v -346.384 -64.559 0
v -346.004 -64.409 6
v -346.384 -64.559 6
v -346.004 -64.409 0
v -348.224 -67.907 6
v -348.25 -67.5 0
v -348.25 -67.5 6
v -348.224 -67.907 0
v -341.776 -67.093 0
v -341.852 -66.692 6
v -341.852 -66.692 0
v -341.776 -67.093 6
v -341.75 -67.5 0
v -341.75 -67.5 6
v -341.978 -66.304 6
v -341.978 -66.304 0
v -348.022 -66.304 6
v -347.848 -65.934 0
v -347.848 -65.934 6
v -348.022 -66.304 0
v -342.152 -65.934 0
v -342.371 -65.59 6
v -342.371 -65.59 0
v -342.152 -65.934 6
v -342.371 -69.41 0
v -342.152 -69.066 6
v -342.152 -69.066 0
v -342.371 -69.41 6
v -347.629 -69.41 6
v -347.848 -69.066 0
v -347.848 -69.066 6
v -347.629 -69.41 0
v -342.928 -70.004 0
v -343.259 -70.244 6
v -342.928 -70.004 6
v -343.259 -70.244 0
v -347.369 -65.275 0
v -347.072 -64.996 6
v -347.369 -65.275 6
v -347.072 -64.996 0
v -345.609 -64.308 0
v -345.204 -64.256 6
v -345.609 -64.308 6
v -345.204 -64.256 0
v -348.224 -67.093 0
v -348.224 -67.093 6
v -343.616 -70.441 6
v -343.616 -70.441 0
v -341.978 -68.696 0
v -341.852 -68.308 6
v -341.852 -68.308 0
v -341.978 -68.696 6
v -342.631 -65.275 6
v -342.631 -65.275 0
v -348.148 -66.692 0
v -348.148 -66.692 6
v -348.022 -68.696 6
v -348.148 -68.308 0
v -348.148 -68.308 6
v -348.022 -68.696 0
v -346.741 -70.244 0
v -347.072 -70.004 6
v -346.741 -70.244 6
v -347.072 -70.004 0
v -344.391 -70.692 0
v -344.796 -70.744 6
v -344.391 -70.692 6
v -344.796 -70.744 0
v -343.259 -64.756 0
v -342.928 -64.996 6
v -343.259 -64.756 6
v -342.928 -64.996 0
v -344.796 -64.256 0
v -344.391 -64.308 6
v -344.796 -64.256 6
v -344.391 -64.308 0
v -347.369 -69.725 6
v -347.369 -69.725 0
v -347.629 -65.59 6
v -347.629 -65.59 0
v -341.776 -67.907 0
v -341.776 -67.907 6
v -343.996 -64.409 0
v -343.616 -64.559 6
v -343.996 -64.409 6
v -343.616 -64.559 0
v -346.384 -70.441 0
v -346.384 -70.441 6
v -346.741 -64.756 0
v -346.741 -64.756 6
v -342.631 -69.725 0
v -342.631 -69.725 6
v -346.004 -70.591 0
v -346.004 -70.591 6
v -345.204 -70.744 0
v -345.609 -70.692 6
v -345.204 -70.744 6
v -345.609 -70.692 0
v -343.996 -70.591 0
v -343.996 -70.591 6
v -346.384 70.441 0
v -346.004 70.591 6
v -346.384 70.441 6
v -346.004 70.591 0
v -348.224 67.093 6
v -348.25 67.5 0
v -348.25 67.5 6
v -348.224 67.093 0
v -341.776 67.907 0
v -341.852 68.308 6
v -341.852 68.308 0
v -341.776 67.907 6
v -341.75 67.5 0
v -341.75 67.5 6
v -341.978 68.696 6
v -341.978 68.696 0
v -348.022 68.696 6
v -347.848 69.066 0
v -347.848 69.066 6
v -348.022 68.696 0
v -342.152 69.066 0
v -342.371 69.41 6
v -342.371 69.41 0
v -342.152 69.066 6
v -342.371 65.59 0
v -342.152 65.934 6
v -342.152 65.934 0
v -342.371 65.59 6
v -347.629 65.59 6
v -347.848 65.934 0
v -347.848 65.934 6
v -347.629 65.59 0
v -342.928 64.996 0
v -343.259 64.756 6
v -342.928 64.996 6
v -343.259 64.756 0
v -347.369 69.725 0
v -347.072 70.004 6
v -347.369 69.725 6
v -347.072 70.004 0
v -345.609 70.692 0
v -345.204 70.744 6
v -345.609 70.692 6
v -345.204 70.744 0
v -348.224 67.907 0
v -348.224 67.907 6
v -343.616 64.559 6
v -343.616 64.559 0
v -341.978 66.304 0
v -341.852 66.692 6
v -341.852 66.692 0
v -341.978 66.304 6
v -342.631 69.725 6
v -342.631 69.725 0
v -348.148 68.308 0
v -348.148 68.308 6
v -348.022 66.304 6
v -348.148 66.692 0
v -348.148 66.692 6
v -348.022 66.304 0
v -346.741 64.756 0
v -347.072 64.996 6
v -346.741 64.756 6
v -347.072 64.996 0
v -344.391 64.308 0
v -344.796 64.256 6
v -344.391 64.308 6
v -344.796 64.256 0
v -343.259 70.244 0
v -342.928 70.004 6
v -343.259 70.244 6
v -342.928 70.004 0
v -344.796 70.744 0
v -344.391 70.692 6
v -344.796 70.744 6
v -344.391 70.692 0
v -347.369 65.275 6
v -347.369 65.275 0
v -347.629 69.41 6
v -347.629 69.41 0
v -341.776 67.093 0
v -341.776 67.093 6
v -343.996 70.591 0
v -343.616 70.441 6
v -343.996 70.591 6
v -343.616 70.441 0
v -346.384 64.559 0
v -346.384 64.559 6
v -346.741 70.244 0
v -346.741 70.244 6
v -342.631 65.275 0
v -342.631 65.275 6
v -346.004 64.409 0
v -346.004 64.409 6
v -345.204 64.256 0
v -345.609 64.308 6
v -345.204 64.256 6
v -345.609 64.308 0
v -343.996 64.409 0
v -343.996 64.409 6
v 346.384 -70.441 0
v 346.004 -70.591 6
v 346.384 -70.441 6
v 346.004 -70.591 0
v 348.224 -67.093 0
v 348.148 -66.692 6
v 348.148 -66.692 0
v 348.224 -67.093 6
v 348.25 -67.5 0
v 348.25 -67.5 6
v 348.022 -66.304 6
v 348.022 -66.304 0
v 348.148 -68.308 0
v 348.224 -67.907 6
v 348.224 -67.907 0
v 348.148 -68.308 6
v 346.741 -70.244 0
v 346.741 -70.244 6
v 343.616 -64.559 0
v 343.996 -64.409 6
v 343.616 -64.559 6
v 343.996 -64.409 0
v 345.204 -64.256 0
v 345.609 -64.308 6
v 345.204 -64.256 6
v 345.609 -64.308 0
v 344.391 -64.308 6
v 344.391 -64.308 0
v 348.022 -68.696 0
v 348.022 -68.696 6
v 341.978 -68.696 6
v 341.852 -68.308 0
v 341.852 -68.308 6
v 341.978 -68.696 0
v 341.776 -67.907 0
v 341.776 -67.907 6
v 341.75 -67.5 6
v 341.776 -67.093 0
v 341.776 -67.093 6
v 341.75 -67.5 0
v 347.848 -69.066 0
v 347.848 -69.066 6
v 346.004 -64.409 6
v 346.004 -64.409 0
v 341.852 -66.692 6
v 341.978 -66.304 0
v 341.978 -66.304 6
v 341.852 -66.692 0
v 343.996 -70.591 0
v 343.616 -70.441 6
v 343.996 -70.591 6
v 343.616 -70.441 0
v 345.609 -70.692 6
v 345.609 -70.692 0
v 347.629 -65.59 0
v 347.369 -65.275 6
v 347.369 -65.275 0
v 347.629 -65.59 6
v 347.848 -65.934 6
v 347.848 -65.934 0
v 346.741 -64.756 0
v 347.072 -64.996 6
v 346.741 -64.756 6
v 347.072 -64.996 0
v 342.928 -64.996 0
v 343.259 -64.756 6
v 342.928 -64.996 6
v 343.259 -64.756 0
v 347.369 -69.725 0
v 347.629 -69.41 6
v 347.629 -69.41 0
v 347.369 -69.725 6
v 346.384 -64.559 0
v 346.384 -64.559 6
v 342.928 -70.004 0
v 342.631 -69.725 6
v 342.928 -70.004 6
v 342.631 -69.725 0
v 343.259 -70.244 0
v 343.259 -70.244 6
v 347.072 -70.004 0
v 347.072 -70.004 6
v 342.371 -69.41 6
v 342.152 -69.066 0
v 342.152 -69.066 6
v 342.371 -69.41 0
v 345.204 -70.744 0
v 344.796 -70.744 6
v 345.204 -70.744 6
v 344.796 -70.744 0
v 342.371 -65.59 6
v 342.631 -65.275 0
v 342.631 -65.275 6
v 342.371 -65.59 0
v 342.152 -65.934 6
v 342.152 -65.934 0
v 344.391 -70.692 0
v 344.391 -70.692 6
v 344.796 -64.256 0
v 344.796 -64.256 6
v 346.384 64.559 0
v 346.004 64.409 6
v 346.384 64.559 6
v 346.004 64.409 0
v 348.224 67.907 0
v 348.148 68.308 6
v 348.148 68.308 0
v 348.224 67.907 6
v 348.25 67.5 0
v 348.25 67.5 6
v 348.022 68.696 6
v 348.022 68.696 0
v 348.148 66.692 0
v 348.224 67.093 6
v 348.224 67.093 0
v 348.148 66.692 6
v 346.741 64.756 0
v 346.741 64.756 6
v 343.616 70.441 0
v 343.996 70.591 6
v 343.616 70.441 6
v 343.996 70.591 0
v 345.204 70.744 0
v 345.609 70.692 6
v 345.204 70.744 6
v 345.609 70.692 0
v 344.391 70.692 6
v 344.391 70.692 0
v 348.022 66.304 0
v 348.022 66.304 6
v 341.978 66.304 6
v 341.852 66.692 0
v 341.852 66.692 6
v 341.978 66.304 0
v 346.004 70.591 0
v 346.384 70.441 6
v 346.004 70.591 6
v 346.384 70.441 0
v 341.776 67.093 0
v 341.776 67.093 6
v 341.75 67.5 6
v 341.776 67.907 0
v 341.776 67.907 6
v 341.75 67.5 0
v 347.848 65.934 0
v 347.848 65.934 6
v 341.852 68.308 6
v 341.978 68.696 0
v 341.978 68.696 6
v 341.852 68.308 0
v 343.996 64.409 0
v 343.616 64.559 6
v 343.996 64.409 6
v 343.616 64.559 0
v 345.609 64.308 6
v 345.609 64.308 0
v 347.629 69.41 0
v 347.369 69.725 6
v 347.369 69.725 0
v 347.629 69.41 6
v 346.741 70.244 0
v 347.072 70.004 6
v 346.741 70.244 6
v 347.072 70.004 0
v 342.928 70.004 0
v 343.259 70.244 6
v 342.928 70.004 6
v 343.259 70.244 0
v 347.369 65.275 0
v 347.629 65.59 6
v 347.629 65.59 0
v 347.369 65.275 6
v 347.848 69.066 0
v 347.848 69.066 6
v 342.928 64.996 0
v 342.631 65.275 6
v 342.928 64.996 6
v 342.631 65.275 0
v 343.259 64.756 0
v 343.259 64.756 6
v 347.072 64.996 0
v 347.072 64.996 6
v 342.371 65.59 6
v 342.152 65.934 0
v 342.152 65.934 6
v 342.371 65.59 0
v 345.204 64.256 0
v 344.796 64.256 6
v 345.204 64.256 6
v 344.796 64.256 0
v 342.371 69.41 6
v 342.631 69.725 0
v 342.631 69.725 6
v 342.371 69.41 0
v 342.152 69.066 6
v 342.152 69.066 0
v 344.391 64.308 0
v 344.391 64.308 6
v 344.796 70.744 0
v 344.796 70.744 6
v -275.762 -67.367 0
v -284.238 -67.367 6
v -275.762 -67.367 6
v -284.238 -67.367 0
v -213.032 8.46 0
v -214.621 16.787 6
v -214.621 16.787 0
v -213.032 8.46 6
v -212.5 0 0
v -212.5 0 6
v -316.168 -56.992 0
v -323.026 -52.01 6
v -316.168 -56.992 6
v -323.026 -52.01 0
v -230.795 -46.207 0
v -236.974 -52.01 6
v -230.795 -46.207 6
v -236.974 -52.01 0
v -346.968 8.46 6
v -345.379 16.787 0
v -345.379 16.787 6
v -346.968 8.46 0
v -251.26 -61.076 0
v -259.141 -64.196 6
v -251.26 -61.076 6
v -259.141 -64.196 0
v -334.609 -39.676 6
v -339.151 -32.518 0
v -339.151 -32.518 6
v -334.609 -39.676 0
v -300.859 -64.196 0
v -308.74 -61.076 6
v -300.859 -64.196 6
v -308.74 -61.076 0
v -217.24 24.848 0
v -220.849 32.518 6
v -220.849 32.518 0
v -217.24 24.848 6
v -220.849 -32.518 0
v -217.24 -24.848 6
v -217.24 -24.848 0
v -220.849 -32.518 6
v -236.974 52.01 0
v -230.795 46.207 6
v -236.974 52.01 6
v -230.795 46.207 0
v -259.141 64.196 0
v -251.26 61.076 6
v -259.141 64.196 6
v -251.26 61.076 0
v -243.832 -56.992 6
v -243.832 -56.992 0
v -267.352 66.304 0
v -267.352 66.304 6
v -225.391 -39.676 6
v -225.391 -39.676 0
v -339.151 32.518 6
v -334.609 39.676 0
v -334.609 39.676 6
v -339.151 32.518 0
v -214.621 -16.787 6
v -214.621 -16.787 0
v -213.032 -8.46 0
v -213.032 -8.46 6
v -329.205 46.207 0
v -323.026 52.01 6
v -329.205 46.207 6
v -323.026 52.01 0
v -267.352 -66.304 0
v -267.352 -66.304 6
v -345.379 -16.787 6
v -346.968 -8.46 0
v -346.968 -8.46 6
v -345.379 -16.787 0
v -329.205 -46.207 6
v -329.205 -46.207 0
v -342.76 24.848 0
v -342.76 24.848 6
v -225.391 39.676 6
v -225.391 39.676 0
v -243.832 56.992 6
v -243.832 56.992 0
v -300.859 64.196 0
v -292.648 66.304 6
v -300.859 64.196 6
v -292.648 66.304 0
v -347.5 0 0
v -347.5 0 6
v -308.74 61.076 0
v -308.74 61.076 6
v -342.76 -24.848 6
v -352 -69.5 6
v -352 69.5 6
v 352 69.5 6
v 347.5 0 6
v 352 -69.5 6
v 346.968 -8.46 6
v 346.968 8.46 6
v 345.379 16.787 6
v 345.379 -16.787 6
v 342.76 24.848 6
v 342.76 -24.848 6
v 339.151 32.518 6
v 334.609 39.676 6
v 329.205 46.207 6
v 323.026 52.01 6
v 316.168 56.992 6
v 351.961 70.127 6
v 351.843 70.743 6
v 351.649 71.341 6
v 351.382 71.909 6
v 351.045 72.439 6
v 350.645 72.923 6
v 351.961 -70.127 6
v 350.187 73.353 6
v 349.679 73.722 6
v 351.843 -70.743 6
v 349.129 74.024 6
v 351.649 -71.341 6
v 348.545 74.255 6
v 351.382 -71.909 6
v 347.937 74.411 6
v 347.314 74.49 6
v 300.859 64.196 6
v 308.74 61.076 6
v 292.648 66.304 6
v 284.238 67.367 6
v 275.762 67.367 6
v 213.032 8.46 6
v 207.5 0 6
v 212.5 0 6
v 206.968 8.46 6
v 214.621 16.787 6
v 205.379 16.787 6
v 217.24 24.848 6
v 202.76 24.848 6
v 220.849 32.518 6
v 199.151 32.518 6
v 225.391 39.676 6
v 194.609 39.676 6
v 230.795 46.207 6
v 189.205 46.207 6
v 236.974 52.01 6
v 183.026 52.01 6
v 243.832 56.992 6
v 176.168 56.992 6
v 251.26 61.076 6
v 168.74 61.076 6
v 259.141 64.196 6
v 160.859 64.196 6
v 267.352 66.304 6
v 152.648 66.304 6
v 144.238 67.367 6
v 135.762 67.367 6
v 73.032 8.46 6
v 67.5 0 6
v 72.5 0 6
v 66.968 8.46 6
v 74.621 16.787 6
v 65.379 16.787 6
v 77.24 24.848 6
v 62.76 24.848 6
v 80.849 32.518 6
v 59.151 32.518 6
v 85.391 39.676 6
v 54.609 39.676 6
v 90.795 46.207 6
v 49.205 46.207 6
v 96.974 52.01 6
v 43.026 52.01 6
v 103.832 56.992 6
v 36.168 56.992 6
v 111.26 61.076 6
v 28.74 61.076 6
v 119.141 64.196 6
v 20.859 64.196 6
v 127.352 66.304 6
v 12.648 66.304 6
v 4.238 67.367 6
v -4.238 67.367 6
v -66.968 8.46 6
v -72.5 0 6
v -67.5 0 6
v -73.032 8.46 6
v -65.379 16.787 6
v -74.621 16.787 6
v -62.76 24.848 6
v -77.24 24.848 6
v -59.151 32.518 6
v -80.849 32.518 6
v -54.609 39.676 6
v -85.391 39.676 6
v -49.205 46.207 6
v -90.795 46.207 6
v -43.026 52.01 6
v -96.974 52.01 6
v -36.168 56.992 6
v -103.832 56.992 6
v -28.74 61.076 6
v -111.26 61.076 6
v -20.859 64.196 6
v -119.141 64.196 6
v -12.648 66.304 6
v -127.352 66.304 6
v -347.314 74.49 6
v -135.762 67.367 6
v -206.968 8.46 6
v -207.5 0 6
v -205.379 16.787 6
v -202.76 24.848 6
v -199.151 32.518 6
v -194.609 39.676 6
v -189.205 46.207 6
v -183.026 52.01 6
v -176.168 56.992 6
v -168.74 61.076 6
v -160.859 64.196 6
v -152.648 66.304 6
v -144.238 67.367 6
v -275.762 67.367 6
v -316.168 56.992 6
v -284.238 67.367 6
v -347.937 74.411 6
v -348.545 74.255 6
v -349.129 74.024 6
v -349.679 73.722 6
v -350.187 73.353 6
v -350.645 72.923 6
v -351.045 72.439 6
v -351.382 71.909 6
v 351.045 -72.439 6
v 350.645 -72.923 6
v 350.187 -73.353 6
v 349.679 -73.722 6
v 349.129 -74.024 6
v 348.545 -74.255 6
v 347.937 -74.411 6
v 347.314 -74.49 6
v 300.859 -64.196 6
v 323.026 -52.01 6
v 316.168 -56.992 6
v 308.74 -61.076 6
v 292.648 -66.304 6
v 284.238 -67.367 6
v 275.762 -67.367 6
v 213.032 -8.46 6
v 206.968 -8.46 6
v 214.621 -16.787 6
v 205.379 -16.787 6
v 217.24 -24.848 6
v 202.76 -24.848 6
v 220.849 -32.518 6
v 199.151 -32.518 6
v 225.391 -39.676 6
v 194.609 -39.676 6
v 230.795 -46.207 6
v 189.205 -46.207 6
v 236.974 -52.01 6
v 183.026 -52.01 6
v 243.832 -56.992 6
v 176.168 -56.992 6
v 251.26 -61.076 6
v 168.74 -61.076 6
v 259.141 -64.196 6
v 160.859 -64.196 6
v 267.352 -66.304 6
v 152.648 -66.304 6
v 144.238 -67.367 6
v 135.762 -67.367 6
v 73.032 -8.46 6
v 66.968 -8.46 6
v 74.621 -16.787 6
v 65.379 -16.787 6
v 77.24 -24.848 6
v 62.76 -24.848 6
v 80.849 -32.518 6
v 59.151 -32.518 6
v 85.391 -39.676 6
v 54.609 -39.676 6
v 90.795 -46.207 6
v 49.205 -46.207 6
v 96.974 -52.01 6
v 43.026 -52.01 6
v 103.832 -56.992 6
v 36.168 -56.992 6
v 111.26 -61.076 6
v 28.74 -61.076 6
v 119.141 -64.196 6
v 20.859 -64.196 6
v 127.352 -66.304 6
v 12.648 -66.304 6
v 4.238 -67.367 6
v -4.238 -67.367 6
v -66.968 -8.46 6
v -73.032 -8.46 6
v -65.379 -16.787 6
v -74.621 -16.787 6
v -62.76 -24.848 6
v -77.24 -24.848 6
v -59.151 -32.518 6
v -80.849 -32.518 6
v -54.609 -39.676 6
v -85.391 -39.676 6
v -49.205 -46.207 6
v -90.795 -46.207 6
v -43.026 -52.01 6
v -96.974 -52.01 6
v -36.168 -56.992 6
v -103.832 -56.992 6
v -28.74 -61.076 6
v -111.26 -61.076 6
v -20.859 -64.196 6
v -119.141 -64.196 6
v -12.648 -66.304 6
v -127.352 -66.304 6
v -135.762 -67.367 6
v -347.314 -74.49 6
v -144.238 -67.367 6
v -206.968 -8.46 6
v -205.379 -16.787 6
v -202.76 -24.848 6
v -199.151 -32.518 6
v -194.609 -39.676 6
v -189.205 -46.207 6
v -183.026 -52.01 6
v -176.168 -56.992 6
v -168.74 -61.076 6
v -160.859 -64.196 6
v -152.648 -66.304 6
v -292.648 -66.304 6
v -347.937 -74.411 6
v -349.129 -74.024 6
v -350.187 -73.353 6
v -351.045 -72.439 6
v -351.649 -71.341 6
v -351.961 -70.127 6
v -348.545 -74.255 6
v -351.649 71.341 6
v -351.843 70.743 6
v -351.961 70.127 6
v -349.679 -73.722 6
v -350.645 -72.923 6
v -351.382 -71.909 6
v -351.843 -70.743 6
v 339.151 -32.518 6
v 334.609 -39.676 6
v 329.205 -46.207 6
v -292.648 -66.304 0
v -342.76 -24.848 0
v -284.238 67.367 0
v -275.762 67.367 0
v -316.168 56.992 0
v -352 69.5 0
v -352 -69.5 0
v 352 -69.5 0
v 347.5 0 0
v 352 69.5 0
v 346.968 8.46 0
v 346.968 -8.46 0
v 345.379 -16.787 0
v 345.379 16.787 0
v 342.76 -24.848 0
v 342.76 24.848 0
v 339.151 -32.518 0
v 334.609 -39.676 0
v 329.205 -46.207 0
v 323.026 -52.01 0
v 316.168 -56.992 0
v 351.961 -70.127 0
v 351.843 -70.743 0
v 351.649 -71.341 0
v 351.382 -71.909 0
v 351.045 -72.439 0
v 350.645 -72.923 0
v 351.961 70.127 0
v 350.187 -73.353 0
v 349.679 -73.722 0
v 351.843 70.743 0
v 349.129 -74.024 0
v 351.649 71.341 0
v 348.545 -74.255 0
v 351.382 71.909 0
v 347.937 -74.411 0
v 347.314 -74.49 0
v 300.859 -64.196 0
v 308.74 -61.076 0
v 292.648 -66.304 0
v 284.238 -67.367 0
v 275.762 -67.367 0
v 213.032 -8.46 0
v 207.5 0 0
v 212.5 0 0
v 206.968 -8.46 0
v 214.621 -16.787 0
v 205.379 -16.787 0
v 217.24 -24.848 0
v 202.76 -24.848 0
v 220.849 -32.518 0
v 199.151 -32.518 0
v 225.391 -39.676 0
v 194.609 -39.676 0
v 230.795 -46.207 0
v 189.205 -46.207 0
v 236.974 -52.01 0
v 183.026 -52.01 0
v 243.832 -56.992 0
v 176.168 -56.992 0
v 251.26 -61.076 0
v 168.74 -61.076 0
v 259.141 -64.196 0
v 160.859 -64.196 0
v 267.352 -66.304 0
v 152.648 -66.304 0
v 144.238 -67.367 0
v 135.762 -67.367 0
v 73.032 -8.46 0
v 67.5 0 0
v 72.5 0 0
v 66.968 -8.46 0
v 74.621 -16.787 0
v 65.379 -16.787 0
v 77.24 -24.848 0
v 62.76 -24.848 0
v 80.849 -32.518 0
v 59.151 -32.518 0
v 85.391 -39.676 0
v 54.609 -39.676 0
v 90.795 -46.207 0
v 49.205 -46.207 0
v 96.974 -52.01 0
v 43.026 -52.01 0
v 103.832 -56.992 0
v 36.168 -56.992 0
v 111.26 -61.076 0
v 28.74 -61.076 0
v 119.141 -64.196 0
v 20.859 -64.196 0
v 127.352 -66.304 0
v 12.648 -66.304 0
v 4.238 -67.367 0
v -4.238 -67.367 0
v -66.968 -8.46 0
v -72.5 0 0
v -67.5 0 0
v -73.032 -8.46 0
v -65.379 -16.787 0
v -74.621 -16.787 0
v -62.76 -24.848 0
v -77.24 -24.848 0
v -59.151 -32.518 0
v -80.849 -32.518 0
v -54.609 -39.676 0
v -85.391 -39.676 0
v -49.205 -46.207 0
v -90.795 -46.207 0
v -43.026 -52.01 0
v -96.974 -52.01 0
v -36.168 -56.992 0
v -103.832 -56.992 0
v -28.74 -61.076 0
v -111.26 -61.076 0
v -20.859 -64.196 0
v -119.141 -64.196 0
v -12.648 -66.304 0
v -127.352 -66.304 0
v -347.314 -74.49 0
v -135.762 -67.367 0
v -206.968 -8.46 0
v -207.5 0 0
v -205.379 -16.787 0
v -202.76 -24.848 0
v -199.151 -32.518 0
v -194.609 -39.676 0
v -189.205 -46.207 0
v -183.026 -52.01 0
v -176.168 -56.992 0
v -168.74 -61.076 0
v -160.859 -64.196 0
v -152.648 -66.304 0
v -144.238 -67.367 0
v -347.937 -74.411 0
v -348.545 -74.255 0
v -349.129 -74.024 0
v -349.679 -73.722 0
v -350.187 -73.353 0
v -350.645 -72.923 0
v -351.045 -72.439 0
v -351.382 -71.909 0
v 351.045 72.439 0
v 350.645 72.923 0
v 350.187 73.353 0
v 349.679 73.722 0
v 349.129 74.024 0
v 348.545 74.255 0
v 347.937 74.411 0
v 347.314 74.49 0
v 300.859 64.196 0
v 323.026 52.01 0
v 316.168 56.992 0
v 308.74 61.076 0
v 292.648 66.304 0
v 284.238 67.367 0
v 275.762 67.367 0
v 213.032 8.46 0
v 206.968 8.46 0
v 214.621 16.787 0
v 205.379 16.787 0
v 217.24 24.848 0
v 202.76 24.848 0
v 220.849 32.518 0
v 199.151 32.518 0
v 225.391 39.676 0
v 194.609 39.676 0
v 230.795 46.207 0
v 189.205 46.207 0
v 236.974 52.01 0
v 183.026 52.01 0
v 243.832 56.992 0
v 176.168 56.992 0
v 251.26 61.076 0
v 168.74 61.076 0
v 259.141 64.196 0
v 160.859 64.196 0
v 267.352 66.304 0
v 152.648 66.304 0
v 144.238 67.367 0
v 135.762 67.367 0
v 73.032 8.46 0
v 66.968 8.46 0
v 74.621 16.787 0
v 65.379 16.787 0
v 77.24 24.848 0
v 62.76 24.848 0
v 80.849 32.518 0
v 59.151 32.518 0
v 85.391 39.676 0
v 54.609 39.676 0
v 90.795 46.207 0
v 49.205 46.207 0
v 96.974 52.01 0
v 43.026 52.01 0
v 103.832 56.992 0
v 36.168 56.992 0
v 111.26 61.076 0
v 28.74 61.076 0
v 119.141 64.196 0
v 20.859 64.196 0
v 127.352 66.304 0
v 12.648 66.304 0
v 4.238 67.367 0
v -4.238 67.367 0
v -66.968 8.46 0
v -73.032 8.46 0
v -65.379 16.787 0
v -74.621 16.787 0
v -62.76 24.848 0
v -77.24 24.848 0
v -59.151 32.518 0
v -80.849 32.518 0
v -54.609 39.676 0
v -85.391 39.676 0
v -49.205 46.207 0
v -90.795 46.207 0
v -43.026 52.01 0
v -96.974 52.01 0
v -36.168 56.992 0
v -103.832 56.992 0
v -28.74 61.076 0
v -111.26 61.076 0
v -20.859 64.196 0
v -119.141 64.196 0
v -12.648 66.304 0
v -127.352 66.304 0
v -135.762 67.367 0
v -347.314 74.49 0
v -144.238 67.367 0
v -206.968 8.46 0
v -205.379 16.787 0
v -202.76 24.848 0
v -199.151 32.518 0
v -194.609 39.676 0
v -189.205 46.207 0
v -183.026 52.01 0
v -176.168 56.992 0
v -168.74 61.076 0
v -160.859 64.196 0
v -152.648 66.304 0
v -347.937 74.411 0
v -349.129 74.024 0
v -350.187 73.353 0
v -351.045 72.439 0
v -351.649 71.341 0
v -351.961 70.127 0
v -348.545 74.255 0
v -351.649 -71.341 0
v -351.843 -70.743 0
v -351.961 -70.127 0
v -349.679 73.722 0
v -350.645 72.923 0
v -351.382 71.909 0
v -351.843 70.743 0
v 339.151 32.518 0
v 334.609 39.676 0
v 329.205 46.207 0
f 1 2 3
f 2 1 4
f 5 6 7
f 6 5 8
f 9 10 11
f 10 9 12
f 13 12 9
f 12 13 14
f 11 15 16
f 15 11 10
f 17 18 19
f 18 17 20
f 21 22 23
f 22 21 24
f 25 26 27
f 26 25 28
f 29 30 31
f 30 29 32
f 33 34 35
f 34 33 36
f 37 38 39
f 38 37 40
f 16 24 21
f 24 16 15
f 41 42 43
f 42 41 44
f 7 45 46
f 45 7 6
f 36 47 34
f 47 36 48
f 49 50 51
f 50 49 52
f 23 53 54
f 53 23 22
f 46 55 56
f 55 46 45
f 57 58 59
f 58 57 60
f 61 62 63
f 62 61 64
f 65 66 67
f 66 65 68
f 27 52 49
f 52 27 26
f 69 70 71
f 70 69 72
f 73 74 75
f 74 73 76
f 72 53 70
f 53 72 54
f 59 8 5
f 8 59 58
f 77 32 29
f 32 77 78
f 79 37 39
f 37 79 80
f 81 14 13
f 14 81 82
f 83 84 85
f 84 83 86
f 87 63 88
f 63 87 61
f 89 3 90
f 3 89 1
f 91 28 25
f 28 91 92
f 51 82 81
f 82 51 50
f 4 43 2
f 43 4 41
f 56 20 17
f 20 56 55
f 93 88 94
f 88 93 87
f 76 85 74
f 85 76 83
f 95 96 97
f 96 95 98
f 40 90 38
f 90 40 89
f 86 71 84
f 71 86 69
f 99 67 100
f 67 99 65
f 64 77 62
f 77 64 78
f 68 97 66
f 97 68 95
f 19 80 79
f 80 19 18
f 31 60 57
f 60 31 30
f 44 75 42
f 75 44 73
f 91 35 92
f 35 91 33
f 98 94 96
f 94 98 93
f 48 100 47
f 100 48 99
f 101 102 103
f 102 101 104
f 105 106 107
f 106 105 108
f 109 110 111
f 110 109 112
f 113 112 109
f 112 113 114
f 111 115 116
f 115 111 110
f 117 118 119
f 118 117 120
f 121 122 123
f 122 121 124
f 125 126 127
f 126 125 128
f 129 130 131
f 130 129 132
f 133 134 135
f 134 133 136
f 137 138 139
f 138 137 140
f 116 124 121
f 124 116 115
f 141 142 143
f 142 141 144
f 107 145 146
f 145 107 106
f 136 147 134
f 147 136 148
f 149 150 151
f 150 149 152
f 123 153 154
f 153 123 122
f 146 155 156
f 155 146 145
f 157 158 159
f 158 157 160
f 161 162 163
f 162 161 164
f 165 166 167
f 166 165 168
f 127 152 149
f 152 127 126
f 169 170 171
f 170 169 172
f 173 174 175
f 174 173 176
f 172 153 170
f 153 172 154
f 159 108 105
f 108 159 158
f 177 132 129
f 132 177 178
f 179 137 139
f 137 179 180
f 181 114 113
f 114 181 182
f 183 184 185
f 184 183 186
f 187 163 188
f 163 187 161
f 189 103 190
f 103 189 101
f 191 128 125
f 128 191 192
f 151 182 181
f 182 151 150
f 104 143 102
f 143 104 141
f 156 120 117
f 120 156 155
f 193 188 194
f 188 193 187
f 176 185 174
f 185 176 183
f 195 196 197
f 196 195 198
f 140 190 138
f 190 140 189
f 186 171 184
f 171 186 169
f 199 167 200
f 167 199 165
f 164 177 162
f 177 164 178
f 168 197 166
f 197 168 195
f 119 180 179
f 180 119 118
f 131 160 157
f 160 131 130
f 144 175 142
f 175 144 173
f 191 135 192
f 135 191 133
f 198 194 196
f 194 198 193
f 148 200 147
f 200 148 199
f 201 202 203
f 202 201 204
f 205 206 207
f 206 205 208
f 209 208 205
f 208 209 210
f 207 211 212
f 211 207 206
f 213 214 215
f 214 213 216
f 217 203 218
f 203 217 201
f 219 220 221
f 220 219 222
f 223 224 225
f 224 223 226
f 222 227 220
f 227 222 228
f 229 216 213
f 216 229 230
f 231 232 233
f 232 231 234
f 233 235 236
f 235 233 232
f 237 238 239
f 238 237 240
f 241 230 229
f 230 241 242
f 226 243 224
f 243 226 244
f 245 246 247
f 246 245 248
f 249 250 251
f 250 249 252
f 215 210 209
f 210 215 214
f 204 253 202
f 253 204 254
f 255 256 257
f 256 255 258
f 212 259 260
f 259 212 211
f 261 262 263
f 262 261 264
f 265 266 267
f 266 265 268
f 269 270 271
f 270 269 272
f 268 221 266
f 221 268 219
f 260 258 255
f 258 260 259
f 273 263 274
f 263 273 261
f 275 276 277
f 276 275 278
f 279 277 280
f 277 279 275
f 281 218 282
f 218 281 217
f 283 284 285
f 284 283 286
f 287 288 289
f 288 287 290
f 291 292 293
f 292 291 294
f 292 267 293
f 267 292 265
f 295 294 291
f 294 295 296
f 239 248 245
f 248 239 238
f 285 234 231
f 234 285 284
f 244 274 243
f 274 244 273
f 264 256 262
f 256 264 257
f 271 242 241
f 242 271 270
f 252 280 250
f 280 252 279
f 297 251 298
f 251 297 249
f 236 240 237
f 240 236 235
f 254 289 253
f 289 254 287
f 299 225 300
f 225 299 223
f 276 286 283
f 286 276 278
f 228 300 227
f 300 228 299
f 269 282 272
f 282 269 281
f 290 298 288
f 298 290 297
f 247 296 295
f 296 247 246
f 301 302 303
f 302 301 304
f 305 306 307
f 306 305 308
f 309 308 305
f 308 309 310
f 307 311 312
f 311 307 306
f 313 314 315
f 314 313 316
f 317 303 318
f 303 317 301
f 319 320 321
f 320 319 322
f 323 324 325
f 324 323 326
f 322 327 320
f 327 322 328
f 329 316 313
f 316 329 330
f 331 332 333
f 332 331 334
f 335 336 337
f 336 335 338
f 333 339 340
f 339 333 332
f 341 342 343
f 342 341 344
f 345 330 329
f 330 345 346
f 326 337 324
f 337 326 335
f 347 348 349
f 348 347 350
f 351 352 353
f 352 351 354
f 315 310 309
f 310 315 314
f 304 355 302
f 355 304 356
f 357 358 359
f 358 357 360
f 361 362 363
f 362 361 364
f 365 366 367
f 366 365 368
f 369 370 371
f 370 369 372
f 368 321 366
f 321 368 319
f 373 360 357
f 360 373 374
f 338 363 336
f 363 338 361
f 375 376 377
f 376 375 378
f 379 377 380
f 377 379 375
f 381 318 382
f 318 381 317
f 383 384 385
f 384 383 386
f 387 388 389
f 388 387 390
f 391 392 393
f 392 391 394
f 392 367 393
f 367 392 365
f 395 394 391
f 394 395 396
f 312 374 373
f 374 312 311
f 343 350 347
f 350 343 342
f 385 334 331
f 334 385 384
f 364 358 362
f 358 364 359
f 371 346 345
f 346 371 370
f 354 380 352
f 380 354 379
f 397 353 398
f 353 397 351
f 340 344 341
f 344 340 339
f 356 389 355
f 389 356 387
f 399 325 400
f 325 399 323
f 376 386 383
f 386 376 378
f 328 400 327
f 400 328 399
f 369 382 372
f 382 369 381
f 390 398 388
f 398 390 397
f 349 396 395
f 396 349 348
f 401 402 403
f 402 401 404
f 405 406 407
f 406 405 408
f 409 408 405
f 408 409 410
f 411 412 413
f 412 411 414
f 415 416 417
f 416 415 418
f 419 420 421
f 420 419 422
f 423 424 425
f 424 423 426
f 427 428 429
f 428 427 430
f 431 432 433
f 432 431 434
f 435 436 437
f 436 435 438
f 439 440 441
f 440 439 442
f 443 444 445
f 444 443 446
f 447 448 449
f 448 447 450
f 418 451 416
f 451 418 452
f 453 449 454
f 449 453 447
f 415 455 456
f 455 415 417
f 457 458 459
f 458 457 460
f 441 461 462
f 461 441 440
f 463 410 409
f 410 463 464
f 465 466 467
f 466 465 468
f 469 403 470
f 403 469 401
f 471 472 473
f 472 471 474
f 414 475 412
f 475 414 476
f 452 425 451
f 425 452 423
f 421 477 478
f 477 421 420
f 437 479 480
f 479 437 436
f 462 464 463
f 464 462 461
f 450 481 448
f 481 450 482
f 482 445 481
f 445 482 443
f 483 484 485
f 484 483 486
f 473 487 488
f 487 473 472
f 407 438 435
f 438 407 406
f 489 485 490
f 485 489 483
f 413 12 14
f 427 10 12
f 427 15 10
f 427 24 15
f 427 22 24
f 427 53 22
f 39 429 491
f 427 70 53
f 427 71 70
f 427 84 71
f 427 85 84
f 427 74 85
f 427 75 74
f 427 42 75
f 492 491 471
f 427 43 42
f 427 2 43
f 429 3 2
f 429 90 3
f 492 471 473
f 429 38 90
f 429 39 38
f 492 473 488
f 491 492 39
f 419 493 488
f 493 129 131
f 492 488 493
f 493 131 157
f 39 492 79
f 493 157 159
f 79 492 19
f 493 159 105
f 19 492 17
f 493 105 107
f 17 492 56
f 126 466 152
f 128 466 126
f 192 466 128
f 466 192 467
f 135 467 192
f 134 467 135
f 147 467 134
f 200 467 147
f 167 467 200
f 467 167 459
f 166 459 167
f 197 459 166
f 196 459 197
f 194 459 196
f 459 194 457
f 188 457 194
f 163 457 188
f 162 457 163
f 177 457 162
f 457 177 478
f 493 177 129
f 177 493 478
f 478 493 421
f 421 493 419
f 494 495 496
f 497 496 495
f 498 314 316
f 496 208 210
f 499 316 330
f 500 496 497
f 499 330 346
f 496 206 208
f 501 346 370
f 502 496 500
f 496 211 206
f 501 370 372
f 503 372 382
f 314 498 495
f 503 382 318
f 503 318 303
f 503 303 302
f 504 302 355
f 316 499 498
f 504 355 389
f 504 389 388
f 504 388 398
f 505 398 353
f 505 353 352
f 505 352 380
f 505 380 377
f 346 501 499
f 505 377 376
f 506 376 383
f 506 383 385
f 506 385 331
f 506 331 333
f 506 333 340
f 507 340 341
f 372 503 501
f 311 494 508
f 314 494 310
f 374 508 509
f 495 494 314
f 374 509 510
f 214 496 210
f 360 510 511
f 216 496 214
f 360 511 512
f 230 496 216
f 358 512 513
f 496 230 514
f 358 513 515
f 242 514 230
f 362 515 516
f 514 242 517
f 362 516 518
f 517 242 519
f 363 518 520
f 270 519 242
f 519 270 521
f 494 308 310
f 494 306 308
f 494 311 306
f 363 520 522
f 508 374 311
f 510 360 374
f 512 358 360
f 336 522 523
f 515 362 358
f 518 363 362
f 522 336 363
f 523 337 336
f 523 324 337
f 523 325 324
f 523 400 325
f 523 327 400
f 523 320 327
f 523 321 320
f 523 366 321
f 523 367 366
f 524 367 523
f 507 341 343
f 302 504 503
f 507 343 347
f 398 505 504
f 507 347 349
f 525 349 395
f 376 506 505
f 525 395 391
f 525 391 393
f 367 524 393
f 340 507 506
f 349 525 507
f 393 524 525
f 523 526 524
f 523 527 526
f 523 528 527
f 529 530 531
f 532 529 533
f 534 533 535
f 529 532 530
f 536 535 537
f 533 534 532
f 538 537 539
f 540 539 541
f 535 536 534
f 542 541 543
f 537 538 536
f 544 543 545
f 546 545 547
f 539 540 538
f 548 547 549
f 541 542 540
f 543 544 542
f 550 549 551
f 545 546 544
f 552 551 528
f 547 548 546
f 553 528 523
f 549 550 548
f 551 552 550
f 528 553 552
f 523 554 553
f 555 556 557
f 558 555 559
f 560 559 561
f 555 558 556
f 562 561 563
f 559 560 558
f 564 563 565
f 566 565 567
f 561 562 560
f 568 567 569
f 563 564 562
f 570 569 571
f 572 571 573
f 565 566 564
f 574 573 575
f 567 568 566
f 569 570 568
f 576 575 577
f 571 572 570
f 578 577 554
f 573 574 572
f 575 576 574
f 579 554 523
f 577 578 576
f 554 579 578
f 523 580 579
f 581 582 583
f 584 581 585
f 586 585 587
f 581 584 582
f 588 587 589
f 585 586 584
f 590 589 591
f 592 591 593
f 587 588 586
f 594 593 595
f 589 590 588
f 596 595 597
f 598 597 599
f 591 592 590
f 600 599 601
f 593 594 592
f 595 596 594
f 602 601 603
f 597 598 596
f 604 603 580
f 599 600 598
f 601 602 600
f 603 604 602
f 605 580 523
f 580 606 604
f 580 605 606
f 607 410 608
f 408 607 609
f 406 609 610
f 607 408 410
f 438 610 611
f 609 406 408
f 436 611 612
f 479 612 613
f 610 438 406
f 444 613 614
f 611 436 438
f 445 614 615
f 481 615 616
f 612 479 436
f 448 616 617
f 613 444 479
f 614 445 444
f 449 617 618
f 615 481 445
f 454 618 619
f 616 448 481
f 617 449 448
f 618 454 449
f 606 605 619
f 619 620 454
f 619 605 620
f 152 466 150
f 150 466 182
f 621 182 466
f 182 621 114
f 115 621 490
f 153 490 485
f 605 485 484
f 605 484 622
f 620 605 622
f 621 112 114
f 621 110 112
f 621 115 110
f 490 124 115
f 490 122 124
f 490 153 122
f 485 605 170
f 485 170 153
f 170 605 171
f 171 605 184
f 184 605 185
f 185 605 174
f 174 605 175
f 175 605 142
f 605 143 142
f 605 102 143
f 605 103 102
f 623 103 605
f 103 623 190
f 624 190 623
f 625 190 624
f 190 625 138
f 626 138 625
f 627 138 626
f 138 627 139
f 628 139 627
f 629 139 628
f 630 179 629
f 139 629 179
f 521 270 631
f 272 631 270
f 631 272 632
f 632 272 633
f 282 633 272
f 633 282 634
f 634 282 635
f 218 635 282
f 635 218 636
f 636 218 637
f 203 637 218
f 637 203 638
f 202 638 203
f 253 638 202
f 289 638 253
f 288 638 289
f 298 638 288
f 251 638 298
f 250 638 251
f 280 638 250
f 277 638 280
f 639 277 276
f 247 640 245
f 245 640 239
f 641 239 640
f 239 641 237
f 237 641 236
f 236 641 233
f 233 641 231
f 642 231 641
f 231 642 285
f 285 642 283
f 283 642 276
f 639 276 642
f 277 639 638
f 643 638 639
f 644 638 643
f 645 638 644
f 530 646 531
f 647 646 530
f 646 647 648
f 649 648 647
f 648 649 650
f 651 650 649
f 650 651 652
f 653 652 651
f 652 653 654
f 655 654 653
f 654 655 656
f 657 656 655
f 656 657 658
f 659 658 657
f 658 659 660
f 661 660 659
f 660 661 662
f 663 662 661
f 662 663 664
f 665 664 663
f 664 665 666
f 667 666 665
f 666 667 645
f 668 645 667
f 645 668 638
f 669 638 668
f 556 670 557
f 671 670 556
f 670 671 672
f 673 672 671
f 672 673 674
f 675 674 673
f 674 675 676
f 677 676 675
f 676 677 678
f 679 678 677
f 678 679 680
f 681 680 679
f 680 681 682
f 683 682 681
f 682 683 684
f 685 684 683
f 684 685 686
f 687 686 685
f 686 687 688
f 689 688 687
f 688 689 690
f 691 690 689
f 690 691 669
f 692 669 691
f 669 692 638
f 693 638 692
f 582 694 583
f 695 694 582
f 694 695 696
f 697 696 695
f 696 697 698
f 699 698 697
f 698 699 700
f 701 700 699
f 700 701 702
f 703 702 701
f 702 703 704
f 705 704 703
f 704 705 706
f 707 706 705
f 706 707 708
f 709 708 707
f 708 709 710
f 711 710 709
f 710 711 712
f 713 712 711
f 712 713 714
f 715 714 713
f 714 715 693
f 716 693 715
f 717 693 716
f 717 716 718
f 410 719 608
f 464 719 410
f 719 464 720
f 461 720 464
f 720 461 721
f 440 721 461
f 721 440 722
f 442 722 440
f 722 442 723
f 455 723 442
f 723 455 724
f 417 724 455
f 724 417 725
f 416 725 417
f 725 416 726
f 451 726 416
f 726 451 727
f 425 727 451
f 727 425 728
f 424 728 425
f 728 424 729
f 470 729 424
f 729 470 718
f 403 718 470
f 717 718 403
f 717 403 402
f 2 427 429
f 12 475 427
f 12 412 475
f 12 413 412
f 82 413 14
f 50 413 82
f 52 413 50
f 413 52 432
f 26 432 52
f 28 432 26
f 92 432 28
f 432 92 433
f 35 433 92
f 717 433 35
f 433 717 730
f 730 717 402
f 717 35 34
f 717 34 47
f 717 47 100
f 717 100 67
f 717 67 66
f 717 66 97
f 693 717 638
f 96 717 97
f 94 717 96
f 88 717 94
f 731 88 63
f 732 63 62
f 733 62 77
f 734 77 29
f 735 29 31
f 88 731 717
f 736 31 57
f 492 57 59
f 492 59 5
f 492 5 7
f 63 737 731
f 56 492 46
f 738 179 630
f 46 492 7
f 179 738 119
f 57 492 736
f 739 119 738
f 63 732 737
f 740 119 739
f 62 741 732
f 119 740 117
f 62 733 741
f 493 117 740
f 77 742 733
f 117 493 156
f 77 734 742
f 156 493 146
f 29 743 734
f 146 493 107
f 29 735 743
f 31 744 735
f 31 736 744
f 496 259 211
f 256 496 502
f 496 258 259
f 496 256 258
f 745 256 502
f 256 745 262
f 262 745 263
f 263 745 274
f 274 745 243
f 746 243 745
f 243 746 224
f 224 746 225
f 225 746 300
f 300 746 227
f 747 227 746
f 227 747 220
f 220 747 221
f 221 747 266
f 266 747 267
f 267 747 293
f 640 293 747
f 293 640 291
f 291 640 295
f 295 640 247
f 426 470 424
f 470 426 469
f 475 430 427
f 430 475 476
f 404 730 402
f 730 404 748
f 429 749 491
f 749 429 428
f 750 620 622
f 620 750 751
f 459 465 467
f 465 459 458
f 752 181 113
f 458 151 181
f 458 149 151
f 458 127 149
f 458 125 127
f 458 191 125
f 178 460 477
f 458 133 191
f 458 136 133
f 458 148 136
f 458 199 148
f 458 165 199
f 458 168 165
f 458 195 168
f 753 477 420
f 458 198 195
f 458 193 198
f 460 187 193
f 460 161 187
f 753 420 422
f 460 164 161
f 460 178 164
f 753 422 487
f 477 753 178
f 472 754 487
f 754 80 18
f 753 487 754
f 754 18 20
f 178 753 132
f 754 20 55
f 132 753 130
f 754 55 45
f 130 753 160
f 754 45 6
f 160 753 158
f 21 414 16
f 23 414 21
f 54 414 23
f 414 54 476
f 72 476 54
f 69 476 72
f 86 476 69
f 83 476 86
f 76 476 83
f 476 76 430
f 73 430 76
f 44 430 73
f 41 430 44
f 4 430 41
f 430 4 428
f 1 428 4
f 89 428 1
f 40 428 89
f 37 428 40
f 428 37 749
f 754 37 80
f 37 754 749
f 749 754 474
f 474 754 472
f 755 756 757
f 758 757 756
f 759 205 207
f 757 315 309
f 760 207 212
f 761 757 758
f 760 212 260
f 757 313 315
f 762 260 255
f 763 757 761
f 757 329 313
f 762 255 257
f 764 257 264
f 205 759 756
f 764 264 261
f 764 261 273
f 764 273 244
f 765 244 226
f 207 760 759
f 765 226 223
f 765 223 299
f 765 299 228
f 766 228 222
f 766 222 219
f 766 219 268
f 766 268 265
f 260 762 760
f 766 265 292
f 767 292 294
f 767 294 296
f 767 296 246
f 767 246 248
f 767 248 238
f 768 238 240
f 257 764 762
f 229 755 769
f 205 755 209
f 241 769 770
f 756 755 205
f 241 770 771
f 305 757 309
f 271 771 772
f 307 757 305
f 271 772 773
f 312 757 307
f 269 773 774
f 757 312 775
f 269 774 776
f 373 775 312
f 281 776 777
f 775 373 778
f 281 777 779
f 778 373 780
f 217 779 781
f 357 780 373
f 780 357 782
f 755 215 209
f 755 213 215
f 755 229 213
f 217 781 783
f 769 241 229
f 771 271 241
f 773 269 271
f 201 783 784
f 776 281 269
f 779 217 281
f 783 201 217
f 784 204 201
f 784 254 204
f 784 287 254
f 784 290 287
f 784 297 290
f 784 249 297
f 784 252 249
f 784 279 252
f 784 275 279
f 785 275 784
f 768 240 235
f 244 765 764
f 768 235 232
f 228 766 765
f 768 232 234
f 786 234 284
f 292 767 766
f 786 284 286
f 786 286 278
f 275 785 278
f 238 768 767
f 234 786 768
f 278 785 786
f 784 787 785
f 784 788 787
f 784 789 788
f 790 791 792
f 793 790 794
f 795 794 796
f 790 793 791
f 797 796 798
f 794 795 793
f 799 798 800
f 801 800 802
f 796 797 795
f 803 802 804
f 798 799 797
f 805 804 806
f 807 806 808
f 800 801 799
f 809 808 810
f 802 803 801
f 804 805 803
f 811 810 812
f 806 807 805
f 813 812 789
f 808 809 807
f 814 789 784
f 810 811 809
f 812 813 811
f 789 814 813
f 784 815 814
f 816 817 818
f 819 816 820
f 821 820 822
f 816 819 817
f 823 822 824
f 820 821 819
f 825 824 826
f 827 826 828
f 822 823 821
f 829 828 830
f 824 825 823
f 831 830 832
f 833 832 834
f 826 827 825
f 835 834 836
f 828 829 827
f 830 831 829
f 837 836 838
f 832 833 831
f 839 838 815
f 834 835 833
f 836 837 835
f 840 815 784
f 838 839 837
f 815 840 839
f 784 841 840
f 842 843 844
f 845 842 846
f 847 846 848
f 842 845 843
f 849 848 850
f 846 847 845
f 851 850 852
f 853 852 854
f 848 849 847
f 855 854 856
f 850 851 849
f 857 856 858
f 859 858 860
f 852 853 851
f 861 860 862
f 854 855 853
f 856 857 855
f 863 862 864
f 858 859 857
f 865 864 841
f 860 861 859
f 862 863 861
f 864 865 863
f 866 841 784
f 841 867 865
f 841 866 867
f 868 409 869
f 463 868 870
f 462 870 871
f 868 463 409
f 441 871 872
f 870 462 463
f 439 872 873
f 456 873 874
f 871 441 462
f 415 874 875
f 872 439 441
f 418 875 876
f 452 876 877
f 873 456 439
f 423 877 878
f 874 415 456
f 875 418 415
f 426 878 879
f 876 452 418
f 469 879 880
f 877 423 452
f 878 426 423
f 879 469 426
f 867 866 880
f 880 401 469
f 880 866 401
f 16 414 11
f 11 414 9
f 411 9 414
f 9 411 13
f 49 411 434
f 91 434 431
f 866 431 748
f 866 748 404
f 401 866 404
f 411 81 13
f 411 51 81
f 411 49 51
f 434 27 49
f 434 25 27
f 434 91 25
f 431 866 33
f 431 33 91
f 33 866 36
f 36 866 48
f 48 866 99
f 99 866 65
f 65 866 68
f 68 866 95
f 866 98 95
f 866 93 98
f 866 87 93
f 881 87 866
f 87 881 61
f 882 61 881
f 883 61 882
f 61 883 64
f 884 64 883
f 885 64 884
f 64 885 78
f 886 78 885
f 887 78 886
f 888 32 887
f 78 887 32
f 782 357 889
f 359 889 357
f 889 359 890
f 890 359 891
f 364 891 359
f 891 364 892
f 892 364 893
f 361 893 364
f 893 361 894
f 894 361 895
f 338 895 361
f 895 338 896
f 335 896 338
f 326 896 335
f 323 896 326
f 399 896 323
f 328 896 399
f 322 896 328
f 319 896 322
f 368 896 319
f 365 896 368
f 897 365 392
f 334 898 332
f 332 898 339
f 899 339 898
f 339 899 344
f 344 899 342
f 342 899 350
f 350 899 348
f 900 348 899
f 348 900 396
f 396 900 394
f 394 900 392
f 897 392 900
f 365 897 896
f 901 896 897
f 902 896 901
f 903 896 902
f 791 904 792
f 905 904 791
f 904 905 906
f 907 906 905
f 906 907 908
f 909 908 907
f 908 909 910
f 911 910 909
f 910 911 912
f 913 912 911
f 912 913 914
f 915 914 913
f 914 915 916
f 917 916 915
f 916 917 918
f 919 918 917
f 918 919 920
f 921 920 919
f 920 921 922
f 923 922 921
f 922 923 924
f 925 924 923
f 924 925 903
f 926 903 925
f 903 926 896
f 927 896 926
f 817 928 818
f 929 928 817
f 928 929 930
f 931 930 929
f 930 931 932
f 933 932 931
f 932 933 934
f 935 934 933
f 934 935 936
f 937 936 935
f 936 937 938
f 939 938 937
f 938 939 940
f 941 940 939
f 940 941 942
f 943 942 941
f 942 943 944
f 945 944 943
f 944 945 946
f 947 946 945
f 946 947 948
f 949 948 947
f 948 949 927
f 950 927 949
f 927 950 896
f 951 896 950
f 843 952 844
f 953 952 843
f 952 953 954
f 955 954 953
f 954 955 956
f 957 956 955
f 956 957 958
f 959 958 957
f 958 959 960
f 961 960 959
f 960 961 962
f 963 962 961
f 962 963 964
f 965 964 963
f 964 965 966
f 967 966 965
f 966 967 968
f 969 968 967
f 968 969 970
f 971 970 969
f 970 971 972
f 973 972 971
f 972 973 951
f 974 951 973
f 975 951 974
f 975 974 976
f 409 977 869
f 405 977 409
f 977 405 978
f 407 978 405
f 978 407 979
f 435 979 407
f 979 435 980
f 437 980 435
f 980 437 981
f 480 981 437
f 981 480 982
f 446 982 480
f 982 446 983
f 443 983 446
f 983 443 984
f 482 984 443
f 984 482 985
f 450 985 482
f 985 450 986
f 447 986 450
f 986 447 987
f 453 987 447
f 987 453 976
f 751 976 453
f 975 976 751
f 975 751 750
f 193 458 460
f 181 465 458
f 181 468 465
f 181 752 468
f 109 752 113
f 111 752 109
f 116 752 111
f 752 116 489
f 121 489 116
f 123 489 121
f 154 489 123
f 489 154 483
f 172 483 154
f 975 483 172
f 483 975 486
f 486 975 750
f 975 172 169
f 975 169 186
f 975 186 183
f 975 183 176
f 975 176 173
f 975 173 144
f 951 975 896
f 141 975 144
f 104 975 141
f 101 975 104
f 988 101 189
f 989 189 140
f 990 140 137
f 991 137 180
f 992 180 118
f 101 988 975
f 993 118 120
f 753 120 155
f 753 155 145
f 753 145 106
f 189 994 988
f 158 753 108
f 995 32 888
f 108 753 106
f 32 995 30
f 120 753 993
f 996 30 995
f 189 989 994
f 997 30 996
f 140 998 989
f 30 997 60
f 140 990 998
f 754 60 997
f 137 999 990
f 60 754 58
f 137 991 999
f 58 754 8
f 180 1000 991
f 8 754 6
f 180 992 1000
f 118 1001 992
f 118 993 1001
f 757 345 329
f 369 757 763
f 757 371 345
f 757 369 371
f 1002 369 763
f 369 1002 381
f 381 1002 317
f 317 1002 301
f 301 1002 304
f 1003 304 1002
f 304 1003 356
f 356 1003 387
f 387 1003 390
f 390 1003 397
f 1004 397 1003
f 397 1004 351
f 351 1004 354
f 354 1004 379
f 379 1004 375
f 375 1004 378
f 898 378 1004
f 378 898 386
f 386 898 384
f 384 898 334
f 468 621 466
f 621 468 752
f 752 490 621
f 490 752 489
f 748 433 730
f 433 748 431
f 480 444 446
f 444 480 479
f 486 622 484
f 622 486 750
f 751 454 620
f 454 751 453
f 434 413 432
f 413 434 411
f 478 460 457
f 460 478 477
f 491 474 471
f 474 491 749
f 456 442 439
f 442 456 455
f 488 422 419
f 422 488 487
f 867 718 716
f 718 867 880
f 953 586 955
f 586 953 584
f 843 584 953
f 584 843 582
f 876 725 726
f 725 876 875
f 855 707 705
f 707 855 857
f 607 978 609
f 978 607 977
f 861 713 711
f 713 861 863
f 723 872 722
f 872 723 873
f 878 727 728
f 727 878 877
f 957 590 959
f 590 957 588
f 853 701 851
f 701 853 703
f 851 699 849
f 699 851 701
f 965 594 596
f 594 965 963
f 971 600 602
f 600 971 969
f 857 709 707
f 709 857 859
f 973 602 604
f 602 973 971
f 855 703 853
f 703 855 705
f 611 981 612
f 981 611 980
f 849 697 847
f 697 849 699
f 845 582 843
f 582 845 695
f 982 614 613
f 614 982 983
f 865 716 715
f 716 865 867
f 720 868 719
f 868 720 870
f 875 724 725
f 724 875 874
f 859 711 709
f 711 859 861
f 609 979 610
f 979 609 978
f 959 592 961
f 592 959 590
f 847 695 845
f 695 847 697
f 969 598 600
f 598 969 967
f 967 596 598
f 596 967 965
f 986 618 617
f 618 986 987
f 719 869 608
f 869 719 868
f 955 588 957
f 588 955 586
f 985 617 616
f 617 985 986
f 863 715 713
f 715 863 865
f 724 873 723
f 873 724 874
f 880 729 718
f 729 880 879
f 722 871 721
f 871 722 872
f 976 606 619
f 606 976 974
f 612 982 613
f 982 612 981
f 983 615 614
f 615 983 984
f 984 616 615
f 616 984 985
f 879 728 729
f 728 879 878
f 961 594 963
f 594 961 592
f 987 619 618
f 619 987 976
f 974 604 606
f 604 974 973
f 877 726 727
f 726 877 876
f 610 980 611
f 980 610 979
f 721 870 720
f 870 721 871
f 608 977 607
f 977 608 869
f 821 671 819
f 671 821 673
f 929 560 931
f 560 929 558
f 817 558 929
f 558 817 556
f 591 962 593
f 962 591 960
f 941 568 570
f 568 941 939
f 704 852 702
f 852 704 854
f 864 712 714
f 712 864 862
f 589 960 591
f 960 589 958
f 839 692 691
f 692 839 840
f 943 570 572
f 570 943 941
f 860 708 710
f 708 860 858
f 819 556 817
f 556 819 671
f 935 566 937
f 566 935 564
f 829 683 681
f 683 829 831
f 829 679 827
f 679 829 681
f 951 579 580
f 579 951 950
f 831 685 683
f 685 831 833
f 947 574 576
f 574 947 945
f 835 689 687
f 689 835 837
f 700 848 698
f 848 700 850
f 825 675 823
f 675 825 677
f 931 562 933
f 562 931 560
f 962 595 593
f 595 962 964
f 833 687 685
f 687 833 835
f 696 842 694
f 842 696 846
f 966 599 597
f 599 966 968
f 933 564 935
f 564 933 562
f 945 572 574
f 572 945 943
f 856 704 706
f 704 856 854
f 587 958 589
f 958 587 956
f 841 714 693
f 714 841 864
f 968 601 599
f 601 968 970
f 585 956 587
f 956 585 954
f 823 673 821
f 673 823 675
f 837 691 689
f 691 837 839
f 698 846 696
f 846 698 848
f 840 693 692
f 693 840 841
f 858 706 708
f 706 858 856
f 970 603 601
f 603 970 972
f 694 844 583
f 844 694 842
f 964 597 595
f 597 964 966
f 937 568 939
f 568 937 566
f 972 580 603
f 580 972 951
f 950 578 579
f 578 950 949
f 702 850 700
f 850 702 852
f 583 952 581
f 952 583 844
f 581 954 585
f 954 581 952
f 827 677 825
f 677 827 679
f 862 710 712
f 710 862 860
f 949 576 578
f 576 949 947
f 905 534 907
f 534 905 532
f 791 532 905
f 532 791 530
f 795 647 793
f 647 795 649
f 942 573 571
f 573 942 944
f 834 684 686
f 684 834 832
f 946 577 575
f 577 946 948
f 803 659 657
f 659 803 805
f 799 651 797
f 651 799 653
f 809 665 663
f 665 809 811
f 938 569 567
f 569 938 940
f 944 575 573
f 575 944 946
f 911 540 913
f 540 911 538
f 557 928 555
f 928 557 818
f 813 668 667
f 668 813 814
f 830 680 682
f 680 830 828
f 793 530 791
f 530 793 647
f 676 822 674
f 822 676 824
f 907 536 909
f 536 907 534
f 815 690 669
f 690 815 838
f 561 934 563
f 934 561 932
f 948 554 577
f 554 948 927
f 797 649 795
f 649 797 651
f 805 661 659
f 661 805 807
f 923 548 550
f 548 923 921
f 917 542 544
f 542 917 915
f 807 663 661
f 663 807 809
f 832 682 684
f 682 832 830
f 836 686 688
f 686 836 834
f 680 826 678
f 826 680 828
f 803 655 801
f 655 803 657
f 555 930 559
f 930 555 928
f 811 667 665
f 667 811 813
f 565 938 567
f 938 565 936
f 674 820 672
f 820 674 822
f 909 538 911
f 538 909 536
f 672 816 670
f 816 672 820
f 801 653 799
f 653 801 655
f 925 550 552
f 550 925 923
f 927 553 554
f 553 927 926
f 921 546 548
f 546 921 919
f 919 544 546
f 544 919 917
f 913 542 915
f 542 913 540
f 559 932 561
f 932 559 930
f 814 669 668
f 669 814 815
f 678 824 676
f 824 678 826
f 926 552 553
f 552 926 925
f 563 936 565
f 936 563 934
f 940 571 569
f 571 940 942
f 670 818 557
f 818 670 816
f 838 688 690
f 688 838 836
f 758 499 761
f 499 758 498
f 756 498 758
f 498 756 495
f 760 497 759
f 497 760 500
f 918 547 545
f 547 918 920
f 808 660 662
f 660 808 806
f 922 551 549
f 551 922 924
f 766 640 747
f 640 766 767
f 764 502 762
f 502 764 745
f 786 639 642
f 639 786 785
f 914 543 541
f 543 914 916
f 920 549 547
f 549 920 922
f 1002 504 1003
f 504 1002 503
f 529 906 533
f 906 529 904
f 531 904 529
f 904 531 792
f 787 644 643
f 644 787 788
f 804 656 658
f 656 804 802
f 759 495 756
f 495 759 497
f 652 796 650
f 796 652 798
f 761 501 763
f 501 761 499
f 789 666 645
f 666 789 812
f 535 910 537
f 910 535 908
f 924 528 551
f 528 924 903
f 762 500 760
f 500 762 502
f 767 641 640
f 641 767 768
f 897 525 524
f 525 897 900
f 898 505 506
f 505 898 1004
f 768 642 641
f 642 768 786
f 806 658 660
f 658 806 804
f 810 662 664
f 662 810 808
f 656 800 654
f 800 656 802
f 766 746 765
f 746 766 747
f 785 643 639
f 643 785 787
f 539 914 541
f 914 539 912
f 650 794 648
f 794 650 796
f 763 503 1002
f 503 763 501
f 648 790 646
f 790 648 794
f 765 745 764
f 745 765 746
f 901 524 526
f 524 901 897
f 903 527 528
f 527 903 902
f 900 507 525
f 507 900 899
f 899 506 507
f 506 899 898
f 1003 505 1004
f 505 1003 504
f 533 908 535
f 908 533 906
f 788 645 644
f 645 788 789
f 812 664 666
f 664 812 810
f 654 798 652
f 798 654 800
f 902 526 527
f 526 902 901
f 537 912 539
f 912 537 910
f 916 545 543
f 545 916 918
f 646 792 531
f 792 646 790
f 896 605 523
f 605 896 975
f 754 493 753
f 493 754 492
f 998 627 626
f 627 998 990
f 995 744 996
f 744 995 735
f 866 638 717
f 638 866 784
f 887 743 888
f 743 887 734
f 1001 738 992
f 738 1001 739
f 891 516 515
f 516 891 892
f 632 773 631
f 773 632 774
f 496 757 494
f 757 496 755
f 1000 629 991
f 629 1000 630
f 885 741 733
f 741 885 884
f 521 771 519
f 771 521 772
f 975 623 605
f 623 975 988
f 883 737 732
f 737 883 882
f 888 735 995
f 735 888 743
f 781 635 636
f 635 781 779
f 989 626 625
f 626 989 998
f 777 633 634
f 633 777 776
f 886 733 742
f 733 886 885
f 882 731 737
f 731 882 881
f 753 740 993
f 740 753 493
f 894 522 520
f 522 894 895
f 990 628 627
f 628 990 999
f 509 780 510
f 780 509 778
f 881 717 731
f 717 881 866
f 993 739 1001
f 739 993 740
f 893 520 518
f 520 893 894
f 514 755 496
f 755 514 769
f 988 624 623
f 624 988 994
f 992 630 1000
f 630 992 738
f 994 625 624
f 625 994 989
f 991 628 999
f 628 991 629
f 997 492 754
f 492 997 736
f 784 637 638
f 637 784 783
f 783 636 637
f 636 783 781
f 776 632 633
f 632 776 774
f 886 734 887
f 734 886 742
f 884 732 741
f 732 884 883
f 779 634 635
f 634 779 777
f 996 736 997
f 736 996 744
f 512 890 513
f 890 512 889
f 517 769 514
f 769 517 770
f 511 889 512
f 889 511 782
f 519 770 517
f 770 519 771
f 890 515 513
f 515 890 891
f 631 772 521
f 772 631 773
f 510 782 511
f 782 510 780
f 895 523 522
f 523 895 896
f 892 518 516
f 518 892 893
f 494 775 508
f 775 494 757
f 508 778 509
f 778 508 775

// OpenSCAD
$fn = 50;


difference() {
	union() {
		hull() {
			translate(v = [-347.0000000000, 69.5000000000, 0]) {
				cylinder(h = 6, r = 5);
			}
			translate(v = [347.0000000000, 69.5000000000, 0]) {
				cylinder(h = 6, r = 5);
			}
			translate(v = [-347.0000000000, -69.5000000000, 0]) {
				cylinder(h = 6, r = 5);
			}
			translate(v = [347.0000000000, -69.5000000000, 0]) {
				cylinder(h = 6, r = 5);
			}
		}
	}
	union() {
		#translate(v = [-345.0000000000, -67.5000000000, -100.0000000000]) {
			cylinder(h = 200, r = 3.2500000000);
		}
		#translate(v = [-345.0000000000, 67.5000000000, -100.0000000000]) {
			cylinder(h = 200, r = 3.2500000000);
		}
		#translate(v = [345.0000000000, -67.5000000000, -100.0000000000]) {
			cylinder(h = 200, r = 3.2500000000);
		}
		#translate(v = [345.0000000000, 67.5000000000, -100.0000000000]) {
			cylinder(h = 200, r = 3.2500000000);
		}
		#translate(v = [-280.0000000000, 0, 0]) {
			cylinder(h = 6, r = 67.5000000000);
		}
		#translate(v = [-140.0000000000, 0, 0]) {
			cylinder(h = 6, r = 67.5000000000);
		}
		#cylinder(h = 6, r = 67.5000000000);
		#translate(v = [140.0000000000, 0, 0]) {
			cylinder(h = 6, r = 67.5000000000);
		}
		#translate(v = [280.0000000000, 0, 0]) {
			cylinder(h = 6, r = 67.5000000000);
		}
	}
}
